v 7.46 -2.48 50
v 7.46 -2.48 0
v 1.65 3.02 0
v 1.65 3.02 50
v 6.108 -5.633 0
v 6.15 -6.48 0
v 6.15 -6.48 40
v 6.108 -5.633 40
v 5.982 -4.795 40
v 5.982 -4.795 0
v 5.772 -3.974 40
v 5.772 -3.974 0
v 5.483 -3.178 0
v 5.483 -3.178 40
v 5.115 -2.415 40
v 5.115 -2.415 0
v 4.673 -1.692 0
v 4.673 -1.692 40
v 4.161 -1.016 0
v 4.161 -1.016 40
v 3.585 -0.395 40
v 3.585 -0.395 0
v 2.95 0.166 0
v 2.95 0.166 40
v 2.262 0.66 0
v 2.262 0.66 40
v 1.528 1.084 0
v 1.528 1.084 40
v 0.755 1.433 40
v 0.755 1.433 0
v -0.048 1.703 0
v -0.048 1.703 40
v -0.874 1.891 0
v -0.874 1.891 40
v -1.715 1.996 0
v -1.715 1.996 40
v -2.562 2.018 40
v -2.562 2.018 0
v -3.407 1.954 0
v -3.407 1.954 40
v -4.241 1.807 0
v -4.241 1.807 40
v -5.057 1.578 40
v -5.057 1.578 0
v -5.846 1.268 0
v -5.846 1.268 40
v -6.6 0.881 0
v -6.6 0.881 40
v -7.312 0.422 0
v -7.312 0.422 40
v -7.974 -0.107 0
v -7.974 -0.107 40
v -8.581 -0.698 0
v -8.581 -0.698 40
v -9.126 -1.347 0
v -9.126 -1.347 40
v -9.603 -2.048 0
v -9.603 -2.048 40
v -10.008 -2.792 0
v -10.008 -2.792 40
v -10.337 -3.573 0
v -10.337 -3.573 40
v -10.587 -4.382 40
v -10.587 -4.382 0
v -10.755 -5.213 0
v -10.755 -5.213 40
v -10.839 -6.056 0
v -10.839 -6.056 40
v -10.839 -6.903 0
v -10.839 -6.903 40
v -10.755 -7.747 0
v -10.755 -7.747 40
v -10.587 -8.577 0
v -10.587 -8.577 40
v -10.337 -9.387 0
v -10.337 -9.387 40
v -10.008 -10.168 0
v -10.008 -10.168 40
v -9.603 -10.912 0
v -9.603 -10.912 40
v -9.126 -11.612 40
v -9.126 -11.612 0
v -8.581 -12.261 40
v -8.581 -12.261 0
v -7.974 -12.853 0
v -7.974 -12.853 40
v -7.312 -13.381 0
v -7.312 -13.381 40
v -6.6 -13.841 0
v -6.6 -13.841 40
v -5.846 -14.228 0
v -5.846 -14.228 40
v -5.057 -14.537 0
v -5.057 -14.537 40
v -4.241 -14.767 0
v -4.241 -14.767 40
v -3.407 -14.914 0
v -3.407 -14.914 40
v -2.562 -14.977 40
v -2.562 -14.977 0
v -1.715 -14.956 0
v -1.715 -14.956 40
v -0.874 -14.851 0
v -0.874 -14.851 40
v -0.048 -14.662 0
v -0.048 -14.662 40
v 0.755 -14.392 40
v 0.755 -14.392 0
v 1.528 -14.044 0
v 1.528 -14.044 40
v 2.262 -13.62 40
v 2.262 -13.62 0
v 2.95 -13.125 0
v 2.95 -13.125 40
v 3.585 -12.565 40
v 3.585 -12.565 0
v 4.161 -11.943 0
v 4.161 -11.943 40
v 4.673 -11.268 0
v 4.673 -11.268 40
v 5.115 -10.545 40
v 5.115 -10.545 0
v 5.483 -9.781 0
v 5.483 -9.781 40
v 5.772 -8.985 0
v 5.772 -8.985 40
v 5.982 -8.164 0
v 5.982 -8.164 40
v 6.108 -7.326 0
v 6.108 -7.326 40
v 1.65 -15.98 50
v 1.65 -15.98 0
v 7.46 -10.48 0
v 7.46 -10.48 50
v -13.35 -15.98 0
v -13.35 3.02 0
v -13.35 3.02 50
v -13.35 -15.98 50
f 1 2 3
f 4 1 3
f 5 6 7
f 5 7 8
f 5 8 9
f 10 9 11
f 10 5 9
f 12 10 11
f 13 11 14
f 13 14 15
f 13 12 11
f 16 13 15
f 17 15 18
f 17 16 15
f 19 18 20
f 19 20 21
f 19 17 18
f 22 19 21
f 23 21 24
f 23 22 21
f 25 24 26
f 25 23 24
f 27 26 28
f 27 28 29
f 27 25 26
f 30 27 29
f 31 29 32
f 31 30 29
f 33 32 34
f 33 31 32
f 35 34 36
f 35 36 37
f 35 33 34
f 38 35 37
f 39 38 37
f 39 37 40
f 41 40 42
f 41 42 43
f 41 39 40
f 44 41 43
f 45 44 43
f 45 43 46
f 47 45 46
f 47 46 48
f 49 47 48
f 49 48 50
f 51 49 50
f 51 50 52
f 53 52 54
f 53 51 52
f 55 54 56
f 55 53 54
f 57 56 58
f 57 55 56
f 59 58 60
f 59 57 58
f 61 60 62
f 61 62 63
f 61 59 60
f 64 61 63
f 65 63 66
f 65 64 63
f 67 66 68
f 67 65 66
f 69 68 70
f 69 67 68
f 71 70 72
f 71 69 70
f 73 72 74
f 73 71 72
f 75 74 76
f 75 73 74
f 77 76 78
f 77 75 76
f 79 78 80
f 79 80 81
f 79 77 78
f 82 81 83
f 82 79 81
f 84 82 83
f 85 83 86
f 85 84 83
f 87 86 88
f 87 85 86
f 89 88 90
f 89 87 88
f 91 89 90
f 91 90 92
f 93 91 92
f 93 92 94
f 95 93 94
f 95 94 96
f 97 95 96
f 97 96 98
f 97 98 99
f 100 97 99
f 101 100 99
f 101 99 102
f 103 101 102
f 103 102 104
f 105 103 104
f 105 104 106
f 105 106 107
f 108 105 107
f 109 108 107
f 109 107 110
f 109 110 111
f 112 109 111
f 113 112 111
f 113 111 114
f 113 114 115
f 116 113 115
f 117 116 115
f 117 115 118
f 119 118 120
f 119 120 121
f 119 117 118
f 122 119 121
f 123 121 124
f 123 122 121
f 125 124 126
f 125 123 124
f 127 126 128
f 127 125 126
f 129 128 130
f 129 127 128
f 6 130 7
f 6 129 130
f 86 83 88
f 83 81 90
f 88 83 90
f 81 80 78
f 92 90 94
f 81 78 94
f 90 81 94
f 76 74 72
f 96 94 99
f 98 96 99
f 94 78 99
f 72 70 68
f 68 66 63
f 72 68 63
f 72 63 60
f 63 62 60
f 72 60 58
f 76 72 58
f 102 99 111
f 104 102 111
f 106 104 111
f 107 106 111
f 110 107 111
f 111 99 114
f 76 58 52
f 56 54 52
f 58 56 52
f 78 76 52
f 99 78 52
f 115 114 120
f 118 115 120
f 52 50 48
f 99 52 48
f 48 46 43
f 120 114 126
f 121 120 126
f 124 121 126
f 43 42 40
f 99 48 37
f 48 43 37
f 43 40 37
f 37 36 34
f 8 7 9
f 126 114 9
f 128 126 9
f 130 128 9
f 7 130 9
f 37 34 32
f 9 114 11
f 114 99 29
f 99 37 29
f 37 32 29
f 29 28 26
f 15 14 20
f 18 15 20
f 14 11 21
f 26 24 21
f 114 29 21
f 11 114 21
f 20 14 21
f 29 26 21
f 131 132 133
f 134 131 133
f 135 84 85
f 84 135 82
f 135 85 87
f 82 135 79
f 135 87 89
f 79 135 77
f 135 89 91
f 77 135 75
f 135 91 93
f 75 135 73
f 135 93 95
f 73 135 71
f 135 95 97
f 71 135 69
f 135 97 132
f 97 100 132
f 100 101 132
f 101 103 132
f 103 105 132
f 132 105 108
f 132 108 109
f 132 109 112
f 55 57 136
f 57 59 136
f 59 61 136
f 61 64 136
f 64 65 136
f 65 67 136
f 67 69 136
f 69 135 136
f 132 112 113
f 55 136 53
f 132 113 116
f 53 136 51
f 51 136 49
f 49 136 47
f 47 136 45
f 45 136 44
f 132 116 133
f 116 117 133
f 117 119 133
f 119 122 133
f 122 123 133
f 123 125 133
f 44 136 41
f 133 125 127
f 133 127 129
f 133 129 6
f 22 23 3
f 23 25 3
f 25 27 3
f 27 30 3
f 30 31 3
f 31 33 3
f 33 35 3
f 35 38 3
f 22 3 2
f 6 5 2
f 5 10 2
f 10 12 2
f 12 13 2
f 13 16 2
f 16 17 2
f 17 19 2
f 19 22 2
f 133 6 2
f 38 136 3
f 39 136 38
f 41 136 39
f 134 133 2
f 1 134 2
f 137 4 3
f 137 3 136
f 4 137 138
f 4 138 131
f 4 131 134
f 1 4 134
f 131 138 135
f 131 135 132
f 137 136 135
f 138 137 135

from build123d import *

# Parameters (mm, degrees)
F1_DEPTH = 50
F2_R     = 8.5
F3_DEPTH = 40


with BuildPart() as f1:
    # F0 (on Top) → F1 (new body)
    with BuildSketch(Plane.XY):
        Polygon((1.650066, 3.020267), (-13.349934, 3.020267), (-13.349934, -15.979733), (1.650066, -15.979733), (7.459541, -10.479733), (7.459541, -2.479733), align=None)
    extrude(amount=F1_DEPTH)

    # F2 (on Top) → F3 (cut)
    with BuildSketch(Plane.XY):
        with Locations((-2.349934, -6.479733)):
            Circle(F2_R)
    extrude(amount=F3_DEPTH, mode=Mode.SUBTRACT)


solid = f1.part
